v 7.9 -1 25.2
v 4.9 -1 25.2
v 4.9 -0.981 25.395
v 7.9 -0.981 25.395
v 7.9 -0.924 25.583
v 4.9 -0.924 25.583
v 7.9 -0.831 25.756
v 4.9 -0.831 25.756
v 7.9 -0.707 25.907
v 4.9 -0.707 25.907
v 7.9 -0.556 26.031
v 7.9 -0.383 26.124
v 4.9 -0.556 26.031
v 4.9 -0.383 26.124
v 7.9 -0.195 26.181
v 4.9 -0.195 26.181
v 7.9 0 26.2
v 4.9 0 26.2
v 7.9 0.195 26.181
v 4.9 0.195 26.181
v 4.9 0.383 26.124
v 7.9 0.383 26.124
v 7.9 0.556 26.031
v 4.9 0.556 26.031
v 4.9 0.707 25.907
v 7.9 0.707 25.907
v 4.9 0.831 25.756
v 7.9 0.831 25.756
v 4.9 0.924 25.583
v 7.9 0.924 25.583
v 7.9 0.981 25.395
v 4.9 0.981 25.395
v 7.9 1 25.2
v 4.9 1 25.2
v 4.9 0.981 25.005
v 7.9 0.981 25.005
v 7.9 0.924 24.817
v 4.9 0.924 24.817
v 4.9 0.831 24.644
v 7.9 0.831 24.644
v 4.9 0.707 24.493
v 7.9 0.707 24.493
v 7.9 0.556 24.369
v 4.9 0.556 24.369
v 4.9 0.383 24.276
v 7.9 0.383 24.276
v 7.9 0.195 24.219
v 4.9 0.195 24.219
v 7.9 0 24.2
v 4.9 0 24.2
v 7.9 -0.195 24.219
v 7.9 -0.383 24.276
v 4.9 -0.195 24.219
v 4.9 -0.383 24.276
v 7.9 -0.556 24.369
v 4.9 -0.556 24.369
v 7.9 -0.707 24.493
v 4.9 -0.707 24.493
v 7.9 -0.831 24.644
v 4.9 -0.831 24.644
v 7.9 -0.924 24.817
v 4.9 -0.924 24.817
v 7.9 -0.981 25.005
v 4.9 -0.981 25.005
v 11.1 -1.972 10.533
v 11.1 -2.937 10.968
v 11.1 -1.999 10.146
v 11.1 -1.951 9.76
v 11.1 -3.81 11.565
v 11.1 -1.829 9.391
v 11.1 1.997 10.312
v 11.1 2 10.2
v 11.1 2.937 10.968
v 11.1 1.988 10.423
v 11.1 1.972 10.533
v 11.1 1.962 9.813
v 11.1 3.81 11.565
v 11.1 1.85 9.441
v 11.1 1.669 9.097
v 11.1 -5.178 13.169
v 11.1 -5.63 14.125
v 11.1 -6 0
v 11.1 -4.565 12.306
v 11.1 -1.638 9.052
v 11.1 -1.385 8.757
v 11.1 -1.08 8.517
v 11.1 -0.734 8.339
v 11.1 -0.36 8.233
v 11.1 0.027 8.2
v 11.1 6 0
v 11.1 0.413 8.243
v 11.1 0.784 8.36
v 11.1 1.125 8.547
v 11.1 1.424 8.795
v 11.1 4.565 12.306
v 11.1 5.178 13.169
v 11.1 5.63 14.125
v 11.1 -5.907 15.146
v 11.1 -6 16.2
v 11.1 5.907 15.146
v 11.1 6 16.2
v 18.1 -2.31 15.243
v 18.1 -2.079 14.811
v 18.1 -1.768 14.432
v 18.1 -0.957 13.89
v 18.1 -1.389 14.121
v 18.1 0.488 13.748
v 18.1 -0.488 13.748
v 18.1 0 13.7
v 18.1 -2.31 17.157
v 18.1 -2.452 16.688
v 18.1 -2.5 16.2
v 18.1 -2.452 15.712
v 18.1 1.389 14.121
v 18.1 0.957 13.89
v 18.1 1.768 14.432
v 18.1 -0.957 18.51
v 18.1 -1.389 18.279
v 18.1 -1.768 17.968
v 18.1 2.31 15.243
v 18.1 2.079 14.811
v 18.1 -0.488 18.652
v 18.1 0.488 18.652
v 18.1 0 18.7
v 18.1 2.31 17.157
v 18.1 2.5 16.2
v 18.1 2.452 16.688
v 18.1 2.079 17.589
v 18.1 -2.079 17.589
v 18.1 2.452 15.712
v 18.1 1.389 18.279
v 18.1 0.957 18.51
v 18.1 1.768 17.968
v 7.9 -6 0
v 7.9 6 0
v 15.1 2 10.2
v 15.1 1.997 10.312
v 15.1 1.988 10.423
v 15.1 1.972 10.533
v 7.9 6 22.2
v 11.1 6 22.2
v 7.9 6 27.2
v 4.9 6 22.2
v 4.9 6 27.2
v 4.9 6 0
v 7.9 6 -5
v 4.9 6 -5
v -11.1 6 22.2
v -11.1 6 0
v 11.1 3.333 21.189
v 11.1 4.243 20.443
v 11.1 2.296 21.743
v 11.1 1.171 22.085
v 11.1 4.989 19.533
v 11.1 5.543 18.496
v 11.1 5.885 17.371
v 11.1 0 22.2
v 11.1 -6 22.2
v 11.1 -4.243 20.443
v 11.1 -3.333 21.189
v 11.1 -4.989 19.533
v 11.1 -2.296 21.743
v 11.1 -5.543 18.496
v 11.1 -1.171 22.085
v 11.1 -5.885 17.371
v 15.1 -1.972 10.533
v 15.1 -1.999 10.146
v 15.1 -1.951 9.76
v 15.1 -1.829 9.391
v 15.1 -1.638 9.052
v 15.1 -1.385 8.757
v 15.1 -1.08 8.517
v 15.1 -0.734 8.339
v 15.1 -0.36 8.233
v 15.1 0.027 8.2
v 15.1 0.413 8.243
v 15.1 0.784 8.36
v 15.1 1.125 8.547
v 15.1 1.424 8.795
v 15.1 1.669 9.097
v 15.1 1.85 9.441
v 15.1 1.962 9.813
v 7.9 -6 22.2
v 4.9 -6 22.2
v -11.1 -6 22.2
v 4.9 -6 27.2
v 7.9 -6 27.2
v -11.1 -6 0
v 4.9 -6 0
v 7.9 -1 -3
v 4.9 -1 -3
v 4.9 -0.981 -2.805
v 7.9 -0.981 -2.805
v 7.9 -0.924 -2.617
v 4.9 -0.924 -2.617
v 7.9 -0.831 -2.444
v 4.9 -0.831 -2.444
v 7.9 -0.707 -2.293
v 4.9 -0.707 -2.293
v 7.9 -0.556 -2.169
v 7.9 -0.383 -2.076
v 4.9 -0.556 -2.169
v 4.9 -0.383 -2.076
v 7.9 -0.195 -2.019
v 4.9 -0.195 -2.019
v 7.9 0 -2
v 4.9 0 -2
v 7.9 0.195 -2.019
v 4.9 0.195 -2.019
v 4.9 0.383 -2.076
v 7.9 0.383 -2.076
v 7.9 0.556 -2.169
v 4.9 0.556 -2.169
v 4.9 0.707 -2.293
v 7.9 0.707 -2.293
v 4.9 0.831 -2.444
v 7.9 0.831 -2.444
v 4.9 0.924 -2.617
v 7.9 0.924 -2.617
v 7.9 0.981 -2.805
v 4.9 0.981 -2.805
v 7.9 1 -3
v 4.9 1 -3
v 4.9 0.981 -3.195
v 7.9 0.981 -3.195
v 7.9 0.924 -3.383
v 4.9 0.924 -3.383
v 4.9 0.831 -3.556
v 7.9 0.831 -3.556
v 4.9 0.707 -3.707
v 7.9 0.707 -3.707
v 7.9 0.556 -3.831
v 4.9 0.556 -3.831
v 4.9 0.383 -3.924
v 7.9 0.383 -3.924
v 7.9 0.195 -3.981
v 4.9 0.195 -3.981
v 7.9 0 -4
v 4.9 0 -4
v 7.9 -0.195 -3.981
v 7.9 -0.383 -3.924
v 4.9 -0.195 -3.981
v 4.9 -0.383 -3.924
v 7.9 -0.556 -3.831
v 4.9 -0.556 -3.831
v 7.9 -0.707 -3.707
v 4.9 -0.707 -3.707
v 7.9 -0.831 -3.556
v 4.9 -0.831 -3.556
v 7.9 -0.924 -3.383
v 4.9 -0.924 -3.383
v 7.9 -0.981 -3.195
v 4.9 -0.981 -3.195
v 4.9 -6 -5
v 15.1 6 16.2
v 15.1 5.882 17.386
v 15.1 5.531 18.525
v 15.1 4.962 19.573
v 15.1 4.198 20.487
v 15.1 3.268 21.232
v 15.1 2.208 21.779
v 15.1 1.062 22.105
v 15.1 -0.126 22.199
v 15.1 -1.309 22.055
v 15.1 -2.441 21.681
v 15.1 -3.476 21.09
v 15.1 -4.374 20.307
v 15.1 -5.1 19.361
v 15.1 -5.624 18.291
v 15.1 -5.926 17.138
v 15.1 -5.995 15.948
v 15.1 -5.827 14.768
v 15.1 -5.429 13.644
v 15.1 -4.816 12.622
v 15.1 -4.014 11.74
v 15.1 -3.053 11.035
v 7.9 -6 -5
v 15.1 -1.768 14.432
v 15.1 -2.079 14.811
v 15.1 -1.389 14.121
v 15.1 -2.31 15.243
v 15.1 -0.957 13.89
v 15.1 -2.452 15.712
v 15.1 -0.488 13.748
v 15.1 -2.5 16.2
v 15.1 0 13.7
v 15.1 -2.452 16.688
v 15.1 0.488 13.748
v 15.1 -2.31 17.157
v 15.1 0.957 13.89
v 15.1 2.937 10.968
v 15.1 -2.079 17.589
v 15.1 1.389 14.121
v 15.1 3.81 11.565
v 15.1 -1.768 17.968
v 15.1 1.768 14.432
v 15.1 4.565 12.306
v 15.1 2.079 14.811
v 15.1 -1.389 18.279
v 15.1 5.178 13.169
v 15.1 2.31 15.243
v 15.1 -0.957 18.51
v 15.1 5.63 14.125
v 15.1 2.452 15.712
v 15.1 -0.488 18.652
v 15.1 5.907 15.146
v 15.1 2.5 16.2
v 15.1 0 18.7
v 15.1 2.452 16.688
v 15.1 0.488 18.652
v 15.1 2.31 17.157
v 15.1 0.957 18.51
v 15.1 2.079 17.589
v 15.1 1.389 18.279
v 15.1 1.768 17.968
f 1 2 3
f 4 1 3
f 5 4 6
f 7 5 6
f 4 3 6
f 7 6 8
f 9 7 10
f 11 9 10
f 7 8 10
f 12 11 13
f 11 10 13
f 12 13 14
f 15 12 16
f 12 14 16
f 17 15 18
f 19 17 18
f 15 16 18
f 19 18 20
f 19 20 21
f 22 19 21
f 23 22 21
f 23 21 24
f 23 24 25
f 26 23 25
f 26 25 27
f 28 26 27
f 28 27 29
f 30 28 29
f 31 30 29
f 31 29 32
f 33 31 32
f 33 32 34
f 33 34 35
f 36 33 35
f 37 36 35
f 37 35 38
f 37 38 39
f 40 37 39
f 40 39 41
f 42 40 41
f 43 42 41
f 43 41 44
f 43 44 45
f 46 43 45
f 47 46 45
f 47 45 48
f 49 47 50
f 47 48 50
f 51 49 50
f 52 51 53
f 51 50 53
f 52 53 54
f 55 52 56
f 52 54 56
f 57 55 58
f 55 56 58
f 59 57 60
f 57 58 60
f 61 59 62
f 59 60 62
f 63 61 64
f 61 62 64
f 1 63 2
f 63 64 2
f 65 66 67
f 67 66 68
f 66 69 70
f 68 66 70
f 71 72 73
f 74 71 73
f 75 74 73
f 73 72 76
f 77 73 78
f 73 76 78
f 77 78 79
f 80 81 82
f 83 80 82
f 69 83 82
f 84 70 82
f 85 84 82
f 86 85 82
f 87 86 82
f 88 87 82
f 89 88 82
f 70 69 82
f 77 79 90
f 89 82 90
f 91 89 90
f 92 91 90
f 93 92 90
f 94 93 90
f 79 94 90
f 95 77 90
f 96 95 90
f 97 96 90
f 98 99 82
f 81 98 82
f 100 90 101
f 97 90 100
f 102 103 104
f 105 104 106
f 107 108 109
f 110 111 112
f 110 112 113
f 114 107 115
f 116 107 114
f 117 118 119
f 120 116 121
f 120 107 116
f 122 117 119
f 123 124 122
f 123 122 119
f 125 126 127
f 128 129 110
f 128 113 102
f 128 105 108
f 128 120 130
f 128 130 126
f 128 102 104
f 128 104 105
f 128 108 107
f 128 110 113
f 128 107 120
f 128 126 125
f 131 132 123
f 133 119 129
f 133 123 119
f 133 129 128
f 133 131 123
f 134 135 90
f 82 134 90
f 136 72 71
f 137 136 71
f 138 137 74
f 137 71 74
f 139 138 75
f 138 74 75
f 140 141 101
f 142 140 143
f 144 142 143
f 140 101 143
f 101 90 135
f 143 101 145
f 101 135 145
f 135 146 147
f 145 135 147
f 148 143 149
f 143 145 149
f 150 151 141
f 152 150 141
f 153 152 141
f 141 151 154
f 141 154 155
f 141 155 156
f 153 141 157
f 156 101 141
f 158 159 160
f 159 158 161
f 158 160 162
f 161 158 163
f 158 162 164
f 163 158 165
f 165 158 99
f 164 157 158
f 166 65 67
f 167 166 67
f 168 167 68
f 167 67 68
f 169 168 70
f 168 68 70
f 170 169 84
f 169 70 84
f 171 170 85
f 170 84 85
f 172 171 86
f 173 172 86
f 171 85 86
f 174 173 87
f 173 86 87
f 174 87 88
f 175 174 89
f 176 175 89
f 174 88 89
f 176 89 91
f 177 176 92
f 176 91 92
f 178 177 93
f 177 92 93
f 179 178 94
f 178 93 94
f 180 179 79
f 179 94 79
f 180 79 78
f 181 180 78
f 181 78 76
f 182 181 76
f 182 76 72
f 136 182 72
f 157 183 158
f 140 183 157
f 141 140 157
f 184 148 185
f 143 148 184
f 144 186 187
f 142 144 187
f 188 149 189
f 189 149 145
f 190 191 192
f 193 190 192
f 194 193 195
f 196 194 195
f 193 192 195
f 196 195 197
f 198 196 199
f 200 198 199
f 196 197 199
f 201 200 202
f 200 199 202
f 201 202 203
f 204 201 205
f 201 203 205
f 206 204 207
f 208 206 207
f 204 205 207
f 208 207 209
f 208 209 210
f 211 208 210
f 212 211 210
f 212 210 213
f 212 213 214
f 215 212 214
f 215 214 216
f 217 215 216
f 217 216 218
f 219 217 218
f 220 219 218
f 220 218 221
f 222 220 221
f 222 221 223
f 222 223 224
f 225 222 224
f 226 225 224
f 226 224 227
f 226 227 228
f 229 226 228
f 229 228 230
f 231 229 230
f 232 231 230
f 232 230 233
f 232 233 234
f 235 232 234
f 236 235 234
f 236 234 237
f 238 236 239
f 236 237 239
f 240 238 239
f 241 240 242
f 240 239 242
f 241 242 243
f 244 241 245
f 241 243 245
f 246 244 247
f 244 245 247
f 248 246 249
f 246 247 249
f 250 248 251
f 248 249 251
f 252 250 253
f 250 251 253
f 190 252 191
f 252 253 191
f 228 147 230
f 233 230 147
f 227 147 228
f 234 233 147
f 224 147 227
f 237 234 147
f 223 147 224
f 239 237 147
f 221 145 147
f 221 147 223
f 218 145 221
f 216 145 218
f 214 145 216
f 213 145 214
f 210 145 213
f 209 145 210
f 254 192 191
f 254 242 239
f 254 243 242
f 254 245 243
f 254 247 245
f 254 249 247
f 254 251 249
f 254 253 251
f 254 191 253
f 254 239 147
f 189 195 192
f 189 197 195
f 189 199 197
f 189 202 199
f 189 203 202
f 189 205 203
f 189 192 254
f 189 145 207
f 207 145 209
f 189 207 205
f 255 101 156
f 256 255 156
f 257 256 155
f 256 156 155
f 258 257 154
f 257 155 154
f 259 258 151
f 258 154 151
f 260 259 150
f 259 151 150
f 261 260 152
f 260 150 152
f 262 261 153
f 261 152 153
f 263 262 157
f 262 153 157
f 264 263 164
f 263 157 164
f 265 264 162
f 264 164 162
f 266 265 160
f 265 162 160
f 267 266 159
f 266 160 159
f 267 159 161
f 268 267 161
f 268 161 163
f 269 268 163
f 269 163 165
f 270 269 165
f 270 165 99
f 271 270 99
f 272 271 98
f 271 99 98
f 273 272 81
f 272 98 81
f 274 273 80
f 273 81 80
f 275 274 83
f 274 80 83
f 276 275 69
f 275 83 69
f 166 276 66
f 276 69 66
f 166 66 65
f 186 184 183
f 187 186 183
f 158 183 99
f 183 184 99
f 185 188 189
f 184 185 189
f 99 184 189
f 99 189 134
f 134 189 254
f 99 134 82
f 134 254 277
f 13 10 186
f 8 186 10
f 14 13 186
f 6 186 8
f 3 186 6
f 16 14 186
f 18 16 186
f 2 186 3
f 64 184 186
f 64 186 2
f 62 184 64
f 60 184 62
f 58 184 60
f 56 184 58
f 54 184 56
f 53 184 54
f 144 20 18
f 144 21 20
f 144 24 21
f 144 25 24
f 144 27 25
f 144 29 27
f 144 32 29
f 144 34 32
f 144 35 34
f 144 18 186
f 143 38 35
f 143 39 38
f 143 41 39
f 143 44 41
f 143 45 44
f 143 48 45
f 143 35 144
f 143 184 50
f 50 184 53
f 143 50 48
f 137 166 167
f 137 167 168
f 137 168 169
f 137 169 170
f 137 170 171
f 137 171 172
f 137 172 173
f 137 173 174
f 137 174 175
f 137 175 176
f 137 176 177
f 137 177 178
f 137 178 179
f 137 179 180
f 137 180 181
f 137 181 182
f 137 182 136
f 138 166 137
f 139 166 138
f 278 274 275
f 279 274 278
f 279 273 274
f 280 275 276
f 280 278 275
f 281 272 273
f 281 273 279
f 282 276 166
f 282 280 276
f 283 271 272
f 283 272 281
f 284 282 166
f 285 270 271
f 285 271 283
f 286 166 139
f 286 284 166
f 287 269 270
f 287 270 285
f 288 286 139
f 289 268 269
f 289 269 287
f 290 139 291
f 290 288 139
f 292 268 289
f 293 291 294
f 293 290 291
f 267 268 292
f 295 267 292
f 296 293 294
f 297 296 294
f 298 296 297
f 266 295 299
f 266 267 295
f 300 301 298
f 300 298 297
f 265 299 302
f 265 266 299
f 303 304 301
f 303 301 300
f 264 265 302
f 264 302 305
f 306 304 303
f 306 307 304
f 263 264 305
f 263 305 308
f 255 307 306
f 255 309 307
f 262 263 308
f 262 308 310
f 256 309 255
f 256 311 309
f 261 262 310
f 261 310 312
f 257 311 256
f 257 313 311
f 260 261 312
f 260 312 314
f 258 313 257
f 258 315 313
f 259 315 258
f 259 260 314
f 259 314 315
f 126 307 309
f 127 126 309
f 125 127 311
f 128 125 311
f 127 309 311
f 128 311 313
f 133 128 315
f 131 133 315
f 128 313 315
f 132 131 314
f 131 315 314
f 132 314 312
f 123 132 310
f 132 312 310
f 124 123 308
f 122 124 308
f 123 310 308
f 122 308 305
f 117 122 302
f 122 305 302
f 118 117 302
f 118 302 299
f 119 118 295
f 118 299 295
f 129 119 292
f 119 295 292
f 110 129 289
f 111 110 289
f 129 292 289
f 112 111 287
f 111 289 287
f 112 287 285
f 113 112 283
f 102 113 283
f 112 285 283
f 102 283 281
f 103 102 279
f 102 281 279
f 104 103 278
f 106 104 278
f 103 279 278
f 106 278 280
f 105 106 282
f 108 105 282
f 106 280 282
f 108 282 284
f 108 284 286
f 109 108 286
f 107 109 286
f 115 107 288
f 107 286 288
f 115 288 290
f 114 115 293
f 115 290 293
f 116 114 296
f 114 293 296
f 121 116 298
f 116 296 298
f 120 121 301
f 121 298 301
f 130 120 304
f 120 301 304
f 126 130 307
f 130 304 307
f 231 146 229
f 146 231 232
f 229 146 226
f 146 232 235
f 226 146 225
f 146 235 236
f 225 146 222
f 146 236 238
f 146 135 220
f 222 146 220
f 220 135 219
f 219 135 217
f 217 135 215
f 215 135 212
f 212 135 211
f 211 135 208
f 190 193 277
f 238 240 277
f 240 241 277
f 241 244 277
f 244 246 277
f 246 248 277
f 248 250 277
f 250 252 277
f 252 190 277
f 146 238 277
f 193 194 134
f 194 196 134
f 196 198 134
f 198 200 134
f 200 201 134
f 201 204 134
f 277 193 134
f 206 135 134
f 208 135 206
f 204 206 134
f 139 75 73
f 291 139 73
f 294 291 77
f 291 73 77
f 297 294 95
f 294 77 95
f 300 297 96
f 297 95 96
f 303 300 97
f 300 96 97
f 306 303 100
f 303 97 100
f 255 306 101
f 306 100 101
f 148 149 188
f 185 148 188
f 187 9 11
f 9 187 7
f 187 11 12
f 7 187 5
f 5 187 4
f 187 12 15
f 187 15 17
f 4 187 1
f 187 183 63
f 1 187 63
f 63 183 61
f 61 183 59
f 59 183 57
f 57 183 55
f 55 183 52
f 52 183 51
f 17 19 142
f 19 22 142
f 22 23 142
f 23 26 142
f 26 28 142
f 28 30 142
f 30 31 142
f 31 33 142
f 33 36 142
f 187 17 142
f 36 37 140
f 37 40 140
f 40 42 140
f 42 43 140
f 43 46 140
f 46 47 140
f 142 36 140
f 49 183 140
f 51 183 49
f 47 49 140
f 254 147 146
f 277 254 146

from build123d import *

# Parameters (mm, degrees)
F1_DEPTH  = 22.2
F2_W      = 3
F2_H      = 12
F3_DEPTH  = 5
F4_W      = 3
F4_H      = 12
F5_DEPTH  = 5
F7_DEPTH  = 4
F8_R      = 2.5
F9_DEPTH  = 3
F10_R     = 1
F11_DEPTH = 25


with BuildPart() as f1:
    # F0 (on Top) → F1 (new body)
    with BuildSketch(Plane.XY):
        Polygon((-11.1, 6), (-11.1, 0), (-11.1, -6), (11.1, -6), (11.1, 0), (11.1, 6), align=None)
    extrude(amount=F1_DEPTH)

    # F2 (on face) → F3 (join)
    with BuildSketch(Plane.XY.offset(22.2)):
        with Locations((6.4, 0)):
            Rectangle(F2_W, F2_H)
    extrude(amount=F3_DEPTH)

    # F4 (on face) → F5 (join)
    with BuildSketch(Plane(origin=(0, 0, 0), x_dir=(1, 0, 0), z_dir=(0, 0, -1))):
        with Locations((6.4, 0)):
            Rectangle(F4_W, F4_H)
    extrude(amount=F5_DEPTH)

    # F6 (on face) → F7 (join)
    with BuildSketch(Plane.YZ.offset(11.1)):
        with BuildLine():
            ThreePointArc((1.9720265944, 10.5333333333), (4.8904069139, 12.7238066485), (6, 16.2))
            ThreePointArc((6, 16.2), (-3.4761933515, 21.0904069139), (-1.9720265944, 10.5333333333))
            ThreePointArc((-1.9720265944, 10.5333333333), (0, 12.2), (1.9720265944, 10.5333333333))
        make_face()
        with BuildLine():
            ThreePointArc((1.9720265944, 10.5333333333), (0, 12.2), (-1.9720265944, 10.5333333333))
            ThreePointArc((-1.9720265944, 10.5333333333), (0, 10.2), (1.9720265944, 10.5333333333))
        make_face()
        with BuildLine():
            ThreePointArc((1.9720265944, 10.5333333333), (0, 10.2), (-1.9720265944, 10.5333333333))
            ThreePointArc((-1.9720265944, 10.5333333333), (-0.1672525206, 8.2070056211), (2, 10.2))
            ThreePointArc((2, 10.2), (1.9929943789, 10.3672525206), (1.9720265944, 10.5333333333))
        make_face()
    extrude(amount=F7_DEPTH)

    # F8 (on face) → F9 (join)
    with BuildSketch(Plane.YZ.offset(15.1)):
        with Locations((0, 16.2)):
            Circle(F8_R)
    extrude(amount=F9_DEPTH)

    # F10 (on face) → F11 (cut)
    with BuildSketch(Plane(origin=(4.9, 0, 0), x_dir=(0, -1, 0), z_dir=(-1, 0, 0))):
        with Locations((0, 25.2)):
            Circle(F10_R)
        with Locations((0, -3)):
            Circle(F10_R)
    extrude(amount=-F11_DEPTH, mode=Mode.SUBTRACT)


solid = f1.part
